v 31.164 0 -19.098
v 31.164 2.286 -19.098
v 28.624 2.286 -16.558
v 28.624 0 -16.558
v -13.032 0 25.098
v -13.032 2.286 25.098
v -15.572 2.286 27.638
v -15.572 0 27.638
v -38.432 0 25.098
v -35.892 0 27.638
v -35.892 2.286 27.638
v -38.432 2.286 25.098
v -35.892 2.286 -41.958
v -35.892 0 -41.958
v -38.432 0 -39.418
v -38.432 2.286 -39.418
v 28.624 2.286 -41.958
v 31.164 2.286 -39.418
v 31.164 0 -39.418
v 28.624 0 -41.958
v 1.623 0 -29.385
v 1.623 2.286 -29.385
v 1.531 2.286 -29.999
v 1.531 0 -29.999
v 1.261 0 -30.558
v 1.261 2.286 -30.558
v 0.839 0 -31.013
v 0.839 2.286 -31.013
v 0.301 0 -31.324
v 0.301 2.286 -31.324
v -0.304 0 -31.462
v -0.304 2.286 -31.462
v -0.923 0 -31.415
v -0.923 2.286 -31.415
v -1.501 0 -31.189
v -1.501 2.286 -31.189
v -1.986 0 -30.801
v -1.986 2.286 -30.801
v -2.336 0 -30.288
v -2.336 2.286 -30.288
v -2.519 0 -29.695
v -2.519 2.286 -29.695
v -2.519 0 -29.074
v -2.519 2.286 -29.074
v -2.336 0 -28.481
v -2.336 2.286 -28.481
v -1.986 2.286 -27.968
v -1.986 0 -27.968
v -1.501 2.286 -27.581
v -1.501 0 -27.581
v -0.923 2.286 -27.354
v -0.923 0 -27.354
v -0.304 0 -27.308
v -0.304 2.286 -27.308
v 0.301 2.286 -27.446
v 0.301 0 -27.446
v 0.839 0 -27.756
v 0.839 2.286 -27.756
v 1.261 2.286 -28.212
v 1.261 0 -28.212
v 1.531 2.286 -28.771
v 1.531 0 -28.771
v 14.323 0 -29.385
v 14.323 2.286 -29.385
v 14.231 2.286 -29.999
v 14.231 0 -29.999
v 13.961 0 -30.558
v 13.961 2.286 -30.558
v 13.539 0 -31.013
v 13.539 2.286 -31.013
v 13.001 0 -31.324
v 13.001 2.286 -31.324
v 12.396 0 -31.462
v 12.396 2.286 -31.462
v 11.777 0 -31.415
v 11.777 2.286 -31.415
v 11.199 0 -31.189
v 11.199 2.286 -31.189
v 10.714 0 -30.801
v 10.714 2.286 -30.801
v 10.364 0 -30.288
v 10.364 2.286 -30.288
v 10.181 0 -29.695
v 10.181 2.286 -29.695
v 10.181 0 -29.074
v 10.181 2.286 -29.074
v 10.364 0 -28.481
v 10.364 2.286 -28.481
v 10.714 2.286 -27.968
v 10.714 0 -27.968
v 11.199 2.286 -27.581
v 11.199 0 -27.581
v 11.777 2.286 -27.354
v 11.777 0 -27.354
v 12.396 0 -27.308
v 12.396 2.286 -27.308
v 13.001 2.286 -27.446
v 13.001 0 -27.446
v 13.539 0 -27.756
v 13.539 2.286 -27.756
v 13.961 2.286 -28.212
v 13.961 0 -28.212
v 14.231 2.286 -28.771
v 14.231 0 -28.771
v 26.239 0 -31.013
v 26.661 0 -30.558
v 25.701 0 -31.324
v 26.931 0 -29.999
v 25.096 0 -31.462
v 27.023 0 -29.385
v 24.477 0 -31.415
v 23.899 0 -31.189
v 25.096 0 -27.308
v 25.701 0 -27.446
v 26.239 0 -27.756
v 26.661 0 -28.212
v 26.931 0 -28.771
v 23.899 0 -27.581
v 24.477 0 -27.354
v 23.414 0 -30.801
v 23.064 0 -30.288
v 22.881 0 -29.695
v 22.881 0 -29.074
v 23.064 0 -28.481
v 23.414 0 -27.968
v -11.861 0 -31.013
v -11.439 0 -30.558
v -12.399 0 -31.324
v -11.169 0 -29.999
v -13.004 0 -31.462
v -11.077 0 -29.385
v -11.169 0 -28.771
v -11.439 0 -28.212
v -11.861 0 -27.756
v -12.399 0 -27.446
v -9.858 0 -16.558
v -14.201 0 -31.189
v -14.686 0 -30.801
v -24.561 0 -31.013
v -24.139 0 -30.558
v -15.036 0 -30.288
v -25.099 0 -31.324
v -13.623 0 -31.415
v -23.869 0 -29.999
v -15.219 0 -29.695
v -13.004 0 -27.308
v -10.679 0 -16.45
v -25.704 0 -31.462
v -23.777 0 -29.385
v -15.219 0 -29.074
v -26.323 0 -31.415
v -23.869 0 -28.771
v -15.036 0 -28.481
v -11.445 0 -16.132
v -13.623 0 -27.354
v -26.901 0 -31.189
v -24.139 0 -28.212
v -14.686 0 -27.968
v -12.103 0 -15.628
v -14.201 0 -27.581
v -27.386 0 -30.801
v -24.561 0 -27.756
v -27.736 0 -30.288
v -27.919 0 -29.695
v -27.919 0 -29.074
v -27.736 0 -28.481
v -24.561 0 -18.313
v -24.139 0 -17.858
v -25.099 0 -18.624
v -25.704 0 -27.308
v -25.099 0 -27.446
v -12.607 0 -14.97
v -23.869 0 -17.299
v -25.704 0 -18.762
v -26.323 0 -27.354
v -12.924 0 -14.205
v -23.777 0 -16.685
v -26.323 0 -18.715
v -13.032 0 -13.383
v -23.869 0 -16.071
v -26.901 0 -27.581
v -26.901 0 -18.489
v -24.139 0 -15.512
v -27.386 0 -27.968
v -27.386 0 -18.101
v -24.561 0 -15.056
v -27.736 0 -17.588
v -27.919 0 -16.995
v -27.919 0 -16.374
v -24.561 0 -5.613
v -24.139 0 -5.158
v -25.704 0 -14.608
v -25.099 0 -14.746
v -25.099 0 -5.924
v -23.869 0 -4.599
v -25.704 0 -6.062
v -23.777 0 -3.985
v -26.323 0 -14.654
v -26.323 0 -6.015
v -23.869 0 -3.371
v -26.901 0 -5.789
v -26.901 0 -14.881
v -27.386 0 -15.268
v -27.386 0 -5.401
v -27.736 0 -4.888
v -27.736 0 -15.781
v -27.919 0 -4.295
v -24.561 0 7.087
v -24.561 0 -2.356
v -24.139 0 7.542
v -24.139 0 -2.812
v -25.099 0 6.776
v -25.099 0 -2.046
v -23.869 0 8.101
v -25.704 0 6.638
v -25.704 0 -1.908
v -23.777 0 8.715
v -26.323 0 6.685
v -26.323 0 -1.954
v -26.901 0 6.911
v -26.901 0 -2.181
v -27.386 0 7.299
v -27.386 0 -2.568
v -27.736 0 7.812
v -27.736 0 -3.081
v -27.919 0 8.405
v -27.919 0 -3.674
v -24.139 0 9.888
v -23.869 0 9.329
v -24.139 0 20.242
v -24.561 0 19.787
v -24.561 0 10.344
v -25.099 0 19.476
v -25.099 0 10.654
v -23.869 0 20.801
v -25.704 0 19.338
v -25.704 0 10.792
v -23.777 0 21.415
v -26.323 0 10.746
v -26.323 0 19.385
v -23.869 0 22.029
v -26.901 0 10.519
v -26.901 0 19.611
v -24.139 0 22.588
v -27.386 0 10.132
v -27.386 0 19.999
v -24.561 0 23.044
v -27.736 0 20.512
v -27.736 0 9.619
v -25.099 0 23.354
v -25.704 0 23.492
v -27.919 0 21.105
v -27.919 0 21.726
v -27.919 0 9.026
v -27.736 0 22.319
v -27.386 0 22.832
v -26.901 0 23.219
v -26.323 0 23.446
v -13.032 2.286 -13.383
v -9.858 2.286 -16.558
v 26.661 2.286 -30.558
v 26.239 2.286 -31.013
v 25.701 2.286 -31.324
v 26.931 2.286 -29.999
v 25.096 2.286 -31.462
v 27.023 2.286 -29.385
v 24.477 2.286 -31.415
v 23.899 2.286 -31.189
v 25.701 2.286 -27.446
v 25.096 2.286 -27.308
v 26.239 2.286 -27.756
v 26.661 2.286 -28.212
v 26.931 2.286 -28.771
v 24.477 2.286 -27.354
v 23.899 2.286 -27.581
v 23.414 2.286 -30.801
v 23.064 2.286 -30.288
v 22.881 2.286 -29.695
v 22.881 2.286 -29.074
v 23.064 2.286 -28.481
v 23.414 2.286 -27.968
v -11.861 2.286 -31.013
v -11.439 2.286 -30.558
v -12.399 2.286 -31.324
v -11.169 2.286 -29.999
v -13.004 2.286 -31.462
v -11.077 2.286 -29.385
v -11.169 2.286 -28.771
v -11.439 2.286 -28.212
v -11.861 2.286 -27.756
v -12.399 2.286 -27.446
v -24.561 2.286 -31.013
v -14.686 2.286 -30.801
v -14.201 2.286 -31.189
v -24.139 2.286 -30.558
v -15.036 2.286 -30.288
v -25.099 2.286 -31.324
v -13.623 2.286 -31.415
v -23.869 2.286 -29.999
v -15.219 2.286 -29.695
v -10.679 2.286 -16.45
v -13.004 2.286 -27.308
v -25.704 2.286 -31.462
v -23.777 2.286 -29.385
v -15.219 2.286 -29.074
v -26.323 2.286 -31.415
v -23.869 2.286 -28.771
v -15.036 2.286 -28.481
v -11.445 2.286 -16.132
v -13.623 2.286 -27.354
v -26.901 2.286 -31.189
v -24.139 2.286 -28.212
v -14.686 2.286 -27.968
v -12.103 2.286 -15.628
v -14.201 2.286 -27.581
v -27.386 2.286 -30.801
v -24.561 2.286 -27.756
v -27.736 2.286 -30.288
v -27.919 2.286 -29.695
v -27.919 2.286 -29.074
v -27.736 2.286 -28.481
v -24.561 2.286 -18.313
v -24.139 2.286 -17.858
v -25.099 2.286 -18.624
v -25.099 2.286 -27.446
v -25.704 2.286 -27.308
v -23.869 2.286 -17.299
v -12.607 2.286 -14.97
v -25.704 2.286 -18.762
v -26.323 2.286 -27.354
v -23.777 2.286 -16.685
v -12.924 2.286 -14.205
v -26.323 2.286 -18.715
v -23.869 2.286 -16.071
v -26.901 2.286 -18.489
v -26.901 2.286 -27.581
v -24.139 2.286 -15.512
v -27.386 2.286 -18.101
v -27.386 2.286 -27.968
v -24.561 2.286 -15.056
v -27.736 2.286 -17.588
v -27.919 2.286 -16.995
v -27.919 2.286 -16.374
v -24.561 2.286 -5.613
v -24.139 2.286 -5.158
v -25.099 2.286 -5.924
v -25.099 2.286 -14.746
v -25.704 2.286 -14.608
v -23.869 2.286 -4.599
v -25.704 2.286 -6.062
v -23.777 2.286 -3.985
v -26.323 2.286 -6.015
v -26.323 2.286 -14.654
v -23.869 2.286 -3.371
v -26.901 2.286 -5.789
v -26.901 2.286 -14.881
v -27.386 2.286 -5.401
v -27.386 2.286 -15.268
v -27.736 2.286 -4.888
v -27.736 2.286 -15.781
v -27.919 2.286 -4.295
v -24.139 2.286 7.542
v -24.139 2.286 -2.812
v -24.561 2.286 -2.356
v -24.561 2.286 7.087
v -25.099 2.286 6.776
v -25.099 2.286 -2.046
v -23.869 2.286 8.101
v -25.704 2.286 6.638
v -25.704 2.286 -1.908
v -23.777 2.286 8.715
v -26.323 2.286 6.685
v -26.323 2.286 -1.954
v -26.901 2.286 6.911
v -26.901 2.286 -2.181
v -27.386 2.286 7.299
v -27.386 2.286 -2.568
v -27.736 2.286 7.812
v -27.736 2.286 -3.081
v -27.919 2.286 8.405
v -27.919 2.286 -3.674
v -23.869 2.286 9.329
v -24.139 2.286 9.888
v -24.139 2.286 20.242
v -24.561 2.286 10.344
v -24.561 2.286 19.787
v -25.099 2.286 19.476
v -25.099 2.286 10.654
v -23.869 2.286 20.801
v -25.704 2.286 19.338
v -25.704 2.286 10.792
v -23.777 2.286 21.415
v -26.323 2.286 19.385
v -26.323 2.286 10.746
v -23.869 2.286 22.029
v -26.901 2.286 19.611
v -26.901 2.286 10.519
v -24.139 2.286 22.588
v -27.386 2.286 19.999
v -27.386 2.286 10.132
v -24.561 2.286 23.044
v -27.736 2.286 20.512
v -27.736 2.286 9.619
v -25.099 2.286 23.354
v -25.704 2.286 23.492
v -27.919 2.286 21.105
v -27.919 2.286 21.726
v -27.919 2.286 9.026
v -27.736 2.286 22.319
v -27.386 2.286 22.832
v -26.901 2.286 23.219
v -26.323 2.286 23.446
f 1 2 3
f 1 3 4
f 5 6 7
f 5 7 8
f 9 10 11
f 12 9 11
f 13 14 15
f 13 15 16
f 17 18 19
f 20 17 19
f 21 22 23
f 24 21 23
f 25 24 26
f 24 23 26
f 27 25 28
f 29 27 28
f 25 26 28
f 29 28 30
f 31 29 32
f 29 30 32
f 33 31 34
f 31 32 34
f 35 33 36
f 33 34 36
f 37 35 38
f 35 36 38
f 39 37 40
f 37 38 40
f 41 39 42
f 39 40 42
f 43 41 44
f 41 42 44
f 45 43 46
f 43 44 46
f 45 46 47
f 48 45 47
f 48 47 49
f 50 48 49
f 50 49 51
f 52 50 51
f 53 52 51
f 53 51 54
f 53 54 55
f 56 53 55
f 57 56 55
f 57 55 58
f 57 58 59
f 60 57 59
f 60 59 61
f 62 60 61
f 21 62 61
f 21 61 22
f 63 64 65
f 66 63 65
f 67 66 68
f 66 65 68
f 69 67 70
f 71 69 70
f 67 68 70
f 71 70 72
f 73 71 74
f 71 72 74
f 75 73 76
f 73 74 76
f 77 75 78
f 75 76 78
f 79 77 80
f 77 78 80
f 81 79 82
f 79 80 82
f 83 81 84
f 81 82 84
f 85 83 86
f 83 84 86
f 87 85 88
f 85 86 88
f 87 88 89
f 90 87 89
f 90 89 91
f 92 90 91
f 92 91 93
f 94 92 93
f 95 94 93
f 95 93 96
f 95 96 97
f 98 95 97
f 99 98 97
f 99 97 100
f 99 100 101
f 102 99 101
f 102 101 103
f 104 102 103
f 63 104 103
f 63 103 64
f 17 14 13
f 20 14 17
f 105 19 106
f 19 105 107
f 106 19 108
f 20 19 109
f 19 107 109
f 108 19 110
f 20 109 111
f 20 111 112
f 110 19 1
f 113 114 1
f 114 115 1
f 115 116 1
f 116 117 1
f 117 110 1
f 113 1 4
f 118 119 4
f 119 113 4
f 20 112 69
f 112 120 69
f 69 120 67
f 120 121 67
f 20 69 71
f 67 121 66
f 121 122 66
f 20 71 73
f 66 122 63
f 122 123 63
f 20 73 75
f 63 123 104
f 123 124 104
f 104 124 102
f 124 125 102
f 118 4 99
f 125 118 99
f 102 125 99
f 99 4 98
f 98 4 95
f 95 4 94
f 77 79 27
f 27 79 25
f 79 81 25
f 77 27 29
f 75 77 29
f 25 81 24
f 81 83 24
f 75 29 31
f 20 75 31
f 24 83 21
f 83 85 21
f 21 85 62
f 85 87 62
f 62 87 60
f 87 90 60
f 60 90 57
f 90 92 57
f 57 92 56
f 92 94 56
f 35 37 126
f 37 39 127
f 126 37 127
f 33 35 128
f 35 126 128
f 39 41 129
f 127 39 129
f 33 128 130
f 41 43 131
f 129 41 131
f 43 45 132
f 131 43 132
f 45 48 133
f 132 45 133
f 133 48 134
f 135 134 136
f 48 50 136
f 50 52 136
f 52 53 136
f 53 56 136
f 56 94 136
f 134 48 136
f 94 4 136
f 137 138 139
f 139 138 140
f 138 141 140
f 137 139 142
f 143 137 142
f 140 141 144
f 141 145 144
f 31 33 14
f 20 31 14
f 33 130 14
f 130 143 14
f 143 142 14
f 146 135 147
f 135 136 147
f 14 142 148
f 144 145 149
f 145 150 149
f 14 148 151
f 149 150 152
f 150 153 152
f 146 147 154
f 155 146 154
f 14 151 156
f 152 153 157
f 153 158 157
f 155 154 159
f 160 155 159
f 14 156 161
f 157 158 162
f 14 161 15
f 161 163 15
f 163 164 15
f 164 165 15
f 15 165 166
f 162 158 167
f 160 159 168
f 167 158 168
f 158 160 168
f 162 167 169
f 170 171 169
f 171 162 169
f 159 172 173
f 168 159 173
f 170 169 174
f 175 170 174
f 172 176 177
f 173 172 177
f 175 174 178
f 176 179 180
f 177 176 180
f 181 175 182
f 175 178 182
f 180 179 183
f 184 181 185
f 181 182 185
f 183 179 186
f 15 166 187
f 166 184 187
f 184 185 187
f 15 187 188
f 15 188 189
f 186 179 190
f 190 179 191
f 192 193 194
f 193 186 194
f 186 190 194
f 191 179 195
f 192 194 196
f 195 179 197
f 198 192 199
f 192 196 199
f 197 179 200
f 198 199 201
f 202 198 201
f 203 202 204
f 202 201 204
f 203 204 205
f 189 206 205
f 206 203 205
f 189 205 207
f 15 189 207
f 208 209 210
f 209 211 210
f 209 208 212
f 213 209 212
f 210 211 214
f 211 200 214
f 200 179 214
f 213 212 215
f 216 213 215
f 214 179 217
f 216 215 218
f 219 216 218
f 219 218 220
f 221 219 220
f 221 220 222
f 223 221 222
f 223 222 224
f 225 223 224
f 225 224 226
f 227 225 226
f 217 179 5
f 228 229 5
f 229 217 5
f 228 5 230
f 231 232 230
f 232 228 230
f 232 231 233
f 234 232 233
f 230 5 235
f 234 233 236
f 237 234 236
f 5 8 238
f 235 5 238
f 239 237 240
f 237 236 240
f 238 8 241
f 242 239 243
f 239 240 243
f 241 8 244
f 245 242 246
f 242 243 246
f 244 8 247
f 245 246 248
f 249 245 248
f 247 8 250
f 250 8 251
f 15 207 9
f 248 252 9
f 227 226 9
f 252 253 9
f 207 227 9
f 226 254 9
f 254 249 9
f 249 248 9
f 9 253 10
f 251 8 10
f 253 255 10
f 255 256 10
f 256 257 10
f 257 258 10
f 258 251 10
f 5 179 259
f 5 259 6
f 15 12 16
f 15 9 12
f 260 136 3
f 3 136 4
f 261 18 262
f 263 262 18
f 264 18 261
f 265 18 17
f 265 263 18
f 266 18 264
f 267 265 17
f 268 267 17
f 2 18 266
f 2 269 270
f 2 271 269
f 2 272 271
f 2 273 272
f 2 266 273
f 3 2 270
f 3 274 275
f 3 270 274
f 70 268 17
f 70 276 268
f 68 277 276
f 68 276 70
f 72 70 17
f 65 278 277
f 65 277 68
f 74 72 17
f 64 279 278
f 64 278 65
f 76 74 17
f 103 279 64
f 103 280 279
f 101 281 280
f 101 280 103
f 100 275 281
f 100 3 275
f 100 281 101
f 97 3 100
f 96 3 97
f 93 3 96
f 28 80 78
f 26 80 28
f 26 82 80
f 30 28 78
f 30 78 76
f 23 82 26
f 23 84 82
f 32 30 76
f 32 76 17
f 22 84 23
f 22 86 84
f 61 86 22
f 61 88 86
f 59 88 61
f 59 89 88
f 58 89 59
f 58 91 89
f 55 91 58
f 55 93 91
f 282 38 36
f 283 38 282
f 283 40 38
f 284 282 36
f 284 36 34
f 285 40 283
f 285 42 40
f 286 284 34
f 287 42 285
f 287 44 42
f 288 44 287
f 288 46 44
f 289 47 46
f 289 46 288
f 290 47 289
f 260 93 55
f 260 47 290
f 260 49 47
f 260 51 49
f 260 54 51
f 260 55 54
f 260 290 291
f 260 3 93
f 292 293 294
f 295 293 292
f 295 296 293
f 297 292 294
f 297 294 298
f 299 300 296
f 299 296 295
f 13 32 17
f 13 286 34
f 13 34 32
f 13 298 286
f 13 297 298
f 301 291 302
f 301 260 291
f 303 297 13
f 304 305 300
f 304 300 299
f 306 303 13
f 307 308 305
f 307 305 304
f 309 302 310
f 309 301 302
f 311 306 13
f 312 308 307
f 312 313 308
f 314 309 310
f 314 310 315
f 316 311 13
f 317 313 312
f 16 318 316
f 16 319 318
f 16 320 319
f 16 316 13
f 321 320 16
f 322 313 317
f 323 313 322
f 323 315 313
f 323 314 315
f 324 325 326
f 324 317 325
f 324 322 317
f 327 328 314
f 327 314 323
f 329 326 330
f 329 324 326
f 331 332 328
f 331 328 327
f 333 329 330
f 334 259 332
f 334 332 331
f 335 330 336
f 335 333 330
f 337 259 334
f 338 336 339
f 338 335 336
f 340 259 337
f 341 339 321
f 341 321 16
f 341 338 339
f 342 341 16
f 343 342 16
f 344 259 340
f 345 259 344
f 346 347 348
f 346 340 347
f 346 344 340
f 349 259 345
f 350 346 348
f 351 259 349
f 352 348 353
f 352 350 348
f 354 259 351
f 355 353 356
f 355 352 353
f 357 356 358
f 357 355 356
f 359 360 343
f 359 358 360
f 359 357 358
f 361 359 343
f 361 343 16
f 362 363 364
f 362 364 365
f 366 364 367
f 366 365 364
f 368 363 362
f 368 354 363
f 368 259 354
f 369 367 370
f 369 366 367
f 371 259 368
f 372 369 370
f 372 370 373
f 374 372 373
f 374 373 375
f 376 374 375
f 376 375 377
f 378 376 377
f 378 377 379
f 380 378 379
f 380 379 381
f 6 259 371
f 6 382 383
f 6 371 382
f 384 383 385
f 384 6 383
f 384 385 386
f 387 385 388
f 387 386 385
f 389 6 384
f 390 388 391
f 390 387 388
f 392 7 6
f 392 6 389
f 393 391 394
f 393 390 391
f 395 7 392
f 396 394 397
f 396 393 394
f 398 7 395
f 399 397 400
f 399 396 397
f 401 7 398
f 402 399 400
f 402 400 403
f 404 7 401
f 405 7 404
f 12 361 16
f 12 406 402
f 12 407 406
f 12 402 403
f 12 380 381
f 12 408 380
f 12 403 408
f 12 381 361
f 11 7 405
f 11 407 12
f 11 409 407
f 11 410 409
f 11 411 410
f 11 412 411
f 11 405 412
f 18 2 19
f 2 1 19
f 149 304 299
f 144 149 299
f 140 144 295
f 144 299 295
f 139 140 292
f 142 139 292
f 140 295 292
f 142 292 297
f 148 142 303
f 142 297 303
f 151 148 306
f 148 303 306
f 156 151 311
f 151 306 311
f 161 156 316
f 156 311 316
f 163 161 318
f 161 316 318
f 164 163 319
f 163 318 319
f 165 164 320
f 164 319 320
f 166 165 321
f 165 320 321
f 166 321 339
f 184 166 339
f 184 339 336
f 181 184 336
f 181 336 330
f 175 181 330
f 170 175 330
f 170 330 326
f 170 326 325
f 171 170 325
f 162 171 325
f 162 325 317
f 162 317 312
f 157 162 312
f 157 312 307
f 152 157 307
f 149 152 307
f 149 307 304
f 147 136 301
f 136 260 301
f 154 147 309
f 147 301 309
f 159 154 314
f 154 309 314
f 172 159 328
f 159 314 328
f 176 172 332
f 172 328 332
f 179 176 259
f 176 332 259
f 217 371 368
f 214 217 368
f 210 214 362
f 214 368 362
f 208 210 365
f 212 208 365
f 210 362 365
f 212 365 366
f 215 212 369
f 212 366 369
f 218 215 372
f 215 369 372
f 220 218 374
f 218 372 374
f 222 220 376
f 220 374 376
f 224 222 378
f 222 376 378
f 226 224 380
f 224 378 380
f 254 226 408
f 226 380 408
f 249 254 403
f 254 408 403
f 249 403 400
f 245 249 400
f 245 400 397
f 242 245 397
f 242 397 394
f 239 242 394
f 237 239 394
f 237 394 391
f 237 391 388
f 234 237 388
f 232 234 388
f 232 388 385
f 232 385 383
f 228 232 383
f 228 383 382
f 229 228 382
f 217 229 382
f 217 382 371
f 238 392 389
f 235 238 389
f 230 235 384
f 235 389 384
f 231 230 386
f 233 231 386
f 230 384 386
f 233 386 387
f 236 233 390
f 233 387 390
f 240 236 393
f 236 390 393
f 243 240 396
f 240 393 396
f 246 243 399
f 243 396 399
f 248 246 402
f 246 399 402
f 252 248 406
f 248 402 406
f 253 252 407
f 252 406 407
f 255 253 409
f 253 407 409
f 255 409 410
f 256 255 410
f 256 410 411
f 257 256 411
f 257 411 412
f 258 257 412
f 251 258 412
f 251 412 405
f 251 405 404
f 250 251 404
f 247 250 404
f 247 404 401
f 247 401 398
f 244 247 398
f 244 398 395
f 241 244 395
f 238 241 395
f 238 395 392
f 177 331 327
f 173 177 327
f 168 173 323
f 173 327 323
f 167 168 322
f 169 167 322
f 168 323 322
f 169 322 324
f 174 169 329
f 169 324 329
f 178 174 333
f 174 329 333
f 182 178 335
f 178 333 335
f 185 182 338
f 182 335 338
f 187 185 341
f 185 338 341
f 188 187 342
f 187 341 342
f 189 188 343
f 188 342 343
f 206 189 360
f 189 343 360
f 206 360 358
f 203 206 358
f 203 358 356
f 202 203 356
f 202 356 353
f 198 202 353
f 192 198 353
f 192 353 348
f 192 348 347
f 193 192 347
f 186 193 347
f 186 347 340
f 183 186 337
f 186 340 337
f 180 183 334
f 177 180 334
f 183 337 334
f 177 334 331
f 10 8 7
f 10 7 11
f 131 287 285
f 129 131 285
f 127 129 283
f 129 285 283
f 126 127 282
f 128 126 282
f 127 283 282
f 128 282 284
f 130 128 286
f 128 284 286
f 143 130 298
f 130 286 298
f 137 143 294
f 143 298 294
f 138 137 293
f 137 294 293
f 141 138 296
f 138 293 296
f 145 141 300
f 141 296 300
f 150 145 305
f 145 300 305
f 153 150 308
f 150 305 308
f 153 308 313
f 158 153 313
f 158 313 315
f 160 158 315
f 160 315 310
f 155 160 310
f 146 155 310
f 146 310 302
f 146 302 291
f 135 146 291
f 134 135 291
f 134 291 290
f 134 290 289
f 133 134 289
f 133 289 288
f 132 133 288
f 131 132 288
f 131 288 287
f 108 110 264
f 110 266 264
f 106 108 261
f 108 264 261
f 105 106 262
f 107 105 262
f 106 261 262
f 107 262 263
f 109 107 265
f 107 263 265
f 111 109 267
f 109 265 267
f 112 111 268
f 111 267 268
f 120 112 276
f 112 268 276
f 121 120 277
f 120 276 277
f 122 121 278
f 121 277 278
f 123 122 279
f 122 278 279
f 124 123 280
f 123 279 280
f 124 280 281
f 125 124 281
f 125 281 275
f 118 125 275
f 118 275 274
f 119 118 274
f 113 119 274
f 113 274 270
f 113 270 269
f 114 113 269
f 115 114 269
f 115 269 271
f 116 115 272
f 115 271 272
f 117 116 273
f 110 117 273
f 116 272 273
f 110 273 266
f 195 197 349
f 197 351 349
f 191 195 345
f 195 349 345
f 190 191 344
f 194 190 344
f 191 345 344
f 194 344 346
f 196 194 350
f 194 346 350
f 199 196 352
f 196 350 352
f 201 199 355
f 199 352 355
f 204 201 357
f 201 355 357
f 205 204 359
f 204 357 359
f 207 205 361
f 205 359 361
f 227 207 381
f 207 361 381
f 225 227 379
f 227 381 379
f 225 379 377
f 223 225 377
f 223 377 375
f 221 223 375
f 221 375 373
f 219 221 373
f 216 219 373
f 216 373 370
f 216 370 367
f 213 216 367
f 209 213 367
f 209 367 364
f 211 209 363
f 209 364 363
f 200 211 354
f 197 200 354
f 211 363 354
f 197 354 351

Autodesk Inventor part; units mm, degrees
ref_plane "YZ Plane" through (0, 0, 0) normal (1, 0, 0) x (0, 1, 0)
ref_plane "XZ Plane" through (0, 0, 0) normal (0, 1, 0) x (-1, 0, 0)
ref_plane "XY Plane" through (0, 0, 0) normal (0, 0, 1) x (1, 0, 0)
sketch "Sketch1" plane through (0, 0, 0) normal (0, 1, 0) x (-1, 0, 0)
  line L0 (38.4325, -41.9578) -> (13.0325, -41.9578)
  line L1 (13.0325, -41.9578) -> (13.0325, 27.6382)
  line L2 (13.0325, 27.6382) -> (38.4325, 27.6382)
  line L3 (38.4325, 27.6382) -> (38.4325, -41.9578)
  line L4 (38.4325, -41.9578) -> (-9.6784, 6.153) construction
  line L5 (38.4325, -41.9578) -> (38.4325, -16.5578)
  line L6 (38.4325, -16.5578) -> (-31.1635, -16.5578)
  line L7 (-31.1635, -16.5578) -> (-31.1635, -41.9578)
  line L8 (-31.1635, -41.9578) -> (38.4325, -41.9578)
  point P0 (0, 0)
  point P1 (13.0325, -16.5578)
  dimension "d0" = 25.4
  dimension "d1" = 69.596
  dimension "d2" = 45
extrude "Extrusion1" add sketch "Sketch1" along normal blind 2.286
chamfer "Chamfer1" distance 2.54 angle 45 1 edges at (-13.0325, 1.143, 27.6382)
chamfer "Chamfer2" distance 2.54 angle 45 4 edges at (-38.4325, 1.143, 27.6382) (31.1635, 1.143, -16.5578) (31.1635, 1.143, -41.9578) (-38.4325, 1.143, -41.9578)
fillet "Fillet1" radius 3.175 1 edges at (-13.0325, 1.143, -16.5578)
sketch "Sketch2" plane through (0, 2.286, 0) normal (0, 1, 0) x (1, 0, 0)
  circle A0 centre (-25.8595, 29.3848) radius 2.0828
  line L0 (28.6235, 41.9578) -> (-35.8925, 41.9578) projected
  line L1 (31.1635, 19.0978) -> (31.1635, 39.4178) projected
  point P0 (0, 0)
  dimension "d12" = 12.573
  dimension "d13" = 57.023
  dimension "d14" = 4.1656
extrude "Extrusion2" cut sketch "Sketch2" against normal blind 2.286
pattern_linear "Rectangular Pattern1" count 5 spacing 12.7 along (0, 0, 1) of "Extrusion2"
pattern_linear "Rectangular Pattern2" count 5 spacing 12.7 along (1, 0, 0) of "Extrusion2"
properties part number "VersaGusset 90o"
